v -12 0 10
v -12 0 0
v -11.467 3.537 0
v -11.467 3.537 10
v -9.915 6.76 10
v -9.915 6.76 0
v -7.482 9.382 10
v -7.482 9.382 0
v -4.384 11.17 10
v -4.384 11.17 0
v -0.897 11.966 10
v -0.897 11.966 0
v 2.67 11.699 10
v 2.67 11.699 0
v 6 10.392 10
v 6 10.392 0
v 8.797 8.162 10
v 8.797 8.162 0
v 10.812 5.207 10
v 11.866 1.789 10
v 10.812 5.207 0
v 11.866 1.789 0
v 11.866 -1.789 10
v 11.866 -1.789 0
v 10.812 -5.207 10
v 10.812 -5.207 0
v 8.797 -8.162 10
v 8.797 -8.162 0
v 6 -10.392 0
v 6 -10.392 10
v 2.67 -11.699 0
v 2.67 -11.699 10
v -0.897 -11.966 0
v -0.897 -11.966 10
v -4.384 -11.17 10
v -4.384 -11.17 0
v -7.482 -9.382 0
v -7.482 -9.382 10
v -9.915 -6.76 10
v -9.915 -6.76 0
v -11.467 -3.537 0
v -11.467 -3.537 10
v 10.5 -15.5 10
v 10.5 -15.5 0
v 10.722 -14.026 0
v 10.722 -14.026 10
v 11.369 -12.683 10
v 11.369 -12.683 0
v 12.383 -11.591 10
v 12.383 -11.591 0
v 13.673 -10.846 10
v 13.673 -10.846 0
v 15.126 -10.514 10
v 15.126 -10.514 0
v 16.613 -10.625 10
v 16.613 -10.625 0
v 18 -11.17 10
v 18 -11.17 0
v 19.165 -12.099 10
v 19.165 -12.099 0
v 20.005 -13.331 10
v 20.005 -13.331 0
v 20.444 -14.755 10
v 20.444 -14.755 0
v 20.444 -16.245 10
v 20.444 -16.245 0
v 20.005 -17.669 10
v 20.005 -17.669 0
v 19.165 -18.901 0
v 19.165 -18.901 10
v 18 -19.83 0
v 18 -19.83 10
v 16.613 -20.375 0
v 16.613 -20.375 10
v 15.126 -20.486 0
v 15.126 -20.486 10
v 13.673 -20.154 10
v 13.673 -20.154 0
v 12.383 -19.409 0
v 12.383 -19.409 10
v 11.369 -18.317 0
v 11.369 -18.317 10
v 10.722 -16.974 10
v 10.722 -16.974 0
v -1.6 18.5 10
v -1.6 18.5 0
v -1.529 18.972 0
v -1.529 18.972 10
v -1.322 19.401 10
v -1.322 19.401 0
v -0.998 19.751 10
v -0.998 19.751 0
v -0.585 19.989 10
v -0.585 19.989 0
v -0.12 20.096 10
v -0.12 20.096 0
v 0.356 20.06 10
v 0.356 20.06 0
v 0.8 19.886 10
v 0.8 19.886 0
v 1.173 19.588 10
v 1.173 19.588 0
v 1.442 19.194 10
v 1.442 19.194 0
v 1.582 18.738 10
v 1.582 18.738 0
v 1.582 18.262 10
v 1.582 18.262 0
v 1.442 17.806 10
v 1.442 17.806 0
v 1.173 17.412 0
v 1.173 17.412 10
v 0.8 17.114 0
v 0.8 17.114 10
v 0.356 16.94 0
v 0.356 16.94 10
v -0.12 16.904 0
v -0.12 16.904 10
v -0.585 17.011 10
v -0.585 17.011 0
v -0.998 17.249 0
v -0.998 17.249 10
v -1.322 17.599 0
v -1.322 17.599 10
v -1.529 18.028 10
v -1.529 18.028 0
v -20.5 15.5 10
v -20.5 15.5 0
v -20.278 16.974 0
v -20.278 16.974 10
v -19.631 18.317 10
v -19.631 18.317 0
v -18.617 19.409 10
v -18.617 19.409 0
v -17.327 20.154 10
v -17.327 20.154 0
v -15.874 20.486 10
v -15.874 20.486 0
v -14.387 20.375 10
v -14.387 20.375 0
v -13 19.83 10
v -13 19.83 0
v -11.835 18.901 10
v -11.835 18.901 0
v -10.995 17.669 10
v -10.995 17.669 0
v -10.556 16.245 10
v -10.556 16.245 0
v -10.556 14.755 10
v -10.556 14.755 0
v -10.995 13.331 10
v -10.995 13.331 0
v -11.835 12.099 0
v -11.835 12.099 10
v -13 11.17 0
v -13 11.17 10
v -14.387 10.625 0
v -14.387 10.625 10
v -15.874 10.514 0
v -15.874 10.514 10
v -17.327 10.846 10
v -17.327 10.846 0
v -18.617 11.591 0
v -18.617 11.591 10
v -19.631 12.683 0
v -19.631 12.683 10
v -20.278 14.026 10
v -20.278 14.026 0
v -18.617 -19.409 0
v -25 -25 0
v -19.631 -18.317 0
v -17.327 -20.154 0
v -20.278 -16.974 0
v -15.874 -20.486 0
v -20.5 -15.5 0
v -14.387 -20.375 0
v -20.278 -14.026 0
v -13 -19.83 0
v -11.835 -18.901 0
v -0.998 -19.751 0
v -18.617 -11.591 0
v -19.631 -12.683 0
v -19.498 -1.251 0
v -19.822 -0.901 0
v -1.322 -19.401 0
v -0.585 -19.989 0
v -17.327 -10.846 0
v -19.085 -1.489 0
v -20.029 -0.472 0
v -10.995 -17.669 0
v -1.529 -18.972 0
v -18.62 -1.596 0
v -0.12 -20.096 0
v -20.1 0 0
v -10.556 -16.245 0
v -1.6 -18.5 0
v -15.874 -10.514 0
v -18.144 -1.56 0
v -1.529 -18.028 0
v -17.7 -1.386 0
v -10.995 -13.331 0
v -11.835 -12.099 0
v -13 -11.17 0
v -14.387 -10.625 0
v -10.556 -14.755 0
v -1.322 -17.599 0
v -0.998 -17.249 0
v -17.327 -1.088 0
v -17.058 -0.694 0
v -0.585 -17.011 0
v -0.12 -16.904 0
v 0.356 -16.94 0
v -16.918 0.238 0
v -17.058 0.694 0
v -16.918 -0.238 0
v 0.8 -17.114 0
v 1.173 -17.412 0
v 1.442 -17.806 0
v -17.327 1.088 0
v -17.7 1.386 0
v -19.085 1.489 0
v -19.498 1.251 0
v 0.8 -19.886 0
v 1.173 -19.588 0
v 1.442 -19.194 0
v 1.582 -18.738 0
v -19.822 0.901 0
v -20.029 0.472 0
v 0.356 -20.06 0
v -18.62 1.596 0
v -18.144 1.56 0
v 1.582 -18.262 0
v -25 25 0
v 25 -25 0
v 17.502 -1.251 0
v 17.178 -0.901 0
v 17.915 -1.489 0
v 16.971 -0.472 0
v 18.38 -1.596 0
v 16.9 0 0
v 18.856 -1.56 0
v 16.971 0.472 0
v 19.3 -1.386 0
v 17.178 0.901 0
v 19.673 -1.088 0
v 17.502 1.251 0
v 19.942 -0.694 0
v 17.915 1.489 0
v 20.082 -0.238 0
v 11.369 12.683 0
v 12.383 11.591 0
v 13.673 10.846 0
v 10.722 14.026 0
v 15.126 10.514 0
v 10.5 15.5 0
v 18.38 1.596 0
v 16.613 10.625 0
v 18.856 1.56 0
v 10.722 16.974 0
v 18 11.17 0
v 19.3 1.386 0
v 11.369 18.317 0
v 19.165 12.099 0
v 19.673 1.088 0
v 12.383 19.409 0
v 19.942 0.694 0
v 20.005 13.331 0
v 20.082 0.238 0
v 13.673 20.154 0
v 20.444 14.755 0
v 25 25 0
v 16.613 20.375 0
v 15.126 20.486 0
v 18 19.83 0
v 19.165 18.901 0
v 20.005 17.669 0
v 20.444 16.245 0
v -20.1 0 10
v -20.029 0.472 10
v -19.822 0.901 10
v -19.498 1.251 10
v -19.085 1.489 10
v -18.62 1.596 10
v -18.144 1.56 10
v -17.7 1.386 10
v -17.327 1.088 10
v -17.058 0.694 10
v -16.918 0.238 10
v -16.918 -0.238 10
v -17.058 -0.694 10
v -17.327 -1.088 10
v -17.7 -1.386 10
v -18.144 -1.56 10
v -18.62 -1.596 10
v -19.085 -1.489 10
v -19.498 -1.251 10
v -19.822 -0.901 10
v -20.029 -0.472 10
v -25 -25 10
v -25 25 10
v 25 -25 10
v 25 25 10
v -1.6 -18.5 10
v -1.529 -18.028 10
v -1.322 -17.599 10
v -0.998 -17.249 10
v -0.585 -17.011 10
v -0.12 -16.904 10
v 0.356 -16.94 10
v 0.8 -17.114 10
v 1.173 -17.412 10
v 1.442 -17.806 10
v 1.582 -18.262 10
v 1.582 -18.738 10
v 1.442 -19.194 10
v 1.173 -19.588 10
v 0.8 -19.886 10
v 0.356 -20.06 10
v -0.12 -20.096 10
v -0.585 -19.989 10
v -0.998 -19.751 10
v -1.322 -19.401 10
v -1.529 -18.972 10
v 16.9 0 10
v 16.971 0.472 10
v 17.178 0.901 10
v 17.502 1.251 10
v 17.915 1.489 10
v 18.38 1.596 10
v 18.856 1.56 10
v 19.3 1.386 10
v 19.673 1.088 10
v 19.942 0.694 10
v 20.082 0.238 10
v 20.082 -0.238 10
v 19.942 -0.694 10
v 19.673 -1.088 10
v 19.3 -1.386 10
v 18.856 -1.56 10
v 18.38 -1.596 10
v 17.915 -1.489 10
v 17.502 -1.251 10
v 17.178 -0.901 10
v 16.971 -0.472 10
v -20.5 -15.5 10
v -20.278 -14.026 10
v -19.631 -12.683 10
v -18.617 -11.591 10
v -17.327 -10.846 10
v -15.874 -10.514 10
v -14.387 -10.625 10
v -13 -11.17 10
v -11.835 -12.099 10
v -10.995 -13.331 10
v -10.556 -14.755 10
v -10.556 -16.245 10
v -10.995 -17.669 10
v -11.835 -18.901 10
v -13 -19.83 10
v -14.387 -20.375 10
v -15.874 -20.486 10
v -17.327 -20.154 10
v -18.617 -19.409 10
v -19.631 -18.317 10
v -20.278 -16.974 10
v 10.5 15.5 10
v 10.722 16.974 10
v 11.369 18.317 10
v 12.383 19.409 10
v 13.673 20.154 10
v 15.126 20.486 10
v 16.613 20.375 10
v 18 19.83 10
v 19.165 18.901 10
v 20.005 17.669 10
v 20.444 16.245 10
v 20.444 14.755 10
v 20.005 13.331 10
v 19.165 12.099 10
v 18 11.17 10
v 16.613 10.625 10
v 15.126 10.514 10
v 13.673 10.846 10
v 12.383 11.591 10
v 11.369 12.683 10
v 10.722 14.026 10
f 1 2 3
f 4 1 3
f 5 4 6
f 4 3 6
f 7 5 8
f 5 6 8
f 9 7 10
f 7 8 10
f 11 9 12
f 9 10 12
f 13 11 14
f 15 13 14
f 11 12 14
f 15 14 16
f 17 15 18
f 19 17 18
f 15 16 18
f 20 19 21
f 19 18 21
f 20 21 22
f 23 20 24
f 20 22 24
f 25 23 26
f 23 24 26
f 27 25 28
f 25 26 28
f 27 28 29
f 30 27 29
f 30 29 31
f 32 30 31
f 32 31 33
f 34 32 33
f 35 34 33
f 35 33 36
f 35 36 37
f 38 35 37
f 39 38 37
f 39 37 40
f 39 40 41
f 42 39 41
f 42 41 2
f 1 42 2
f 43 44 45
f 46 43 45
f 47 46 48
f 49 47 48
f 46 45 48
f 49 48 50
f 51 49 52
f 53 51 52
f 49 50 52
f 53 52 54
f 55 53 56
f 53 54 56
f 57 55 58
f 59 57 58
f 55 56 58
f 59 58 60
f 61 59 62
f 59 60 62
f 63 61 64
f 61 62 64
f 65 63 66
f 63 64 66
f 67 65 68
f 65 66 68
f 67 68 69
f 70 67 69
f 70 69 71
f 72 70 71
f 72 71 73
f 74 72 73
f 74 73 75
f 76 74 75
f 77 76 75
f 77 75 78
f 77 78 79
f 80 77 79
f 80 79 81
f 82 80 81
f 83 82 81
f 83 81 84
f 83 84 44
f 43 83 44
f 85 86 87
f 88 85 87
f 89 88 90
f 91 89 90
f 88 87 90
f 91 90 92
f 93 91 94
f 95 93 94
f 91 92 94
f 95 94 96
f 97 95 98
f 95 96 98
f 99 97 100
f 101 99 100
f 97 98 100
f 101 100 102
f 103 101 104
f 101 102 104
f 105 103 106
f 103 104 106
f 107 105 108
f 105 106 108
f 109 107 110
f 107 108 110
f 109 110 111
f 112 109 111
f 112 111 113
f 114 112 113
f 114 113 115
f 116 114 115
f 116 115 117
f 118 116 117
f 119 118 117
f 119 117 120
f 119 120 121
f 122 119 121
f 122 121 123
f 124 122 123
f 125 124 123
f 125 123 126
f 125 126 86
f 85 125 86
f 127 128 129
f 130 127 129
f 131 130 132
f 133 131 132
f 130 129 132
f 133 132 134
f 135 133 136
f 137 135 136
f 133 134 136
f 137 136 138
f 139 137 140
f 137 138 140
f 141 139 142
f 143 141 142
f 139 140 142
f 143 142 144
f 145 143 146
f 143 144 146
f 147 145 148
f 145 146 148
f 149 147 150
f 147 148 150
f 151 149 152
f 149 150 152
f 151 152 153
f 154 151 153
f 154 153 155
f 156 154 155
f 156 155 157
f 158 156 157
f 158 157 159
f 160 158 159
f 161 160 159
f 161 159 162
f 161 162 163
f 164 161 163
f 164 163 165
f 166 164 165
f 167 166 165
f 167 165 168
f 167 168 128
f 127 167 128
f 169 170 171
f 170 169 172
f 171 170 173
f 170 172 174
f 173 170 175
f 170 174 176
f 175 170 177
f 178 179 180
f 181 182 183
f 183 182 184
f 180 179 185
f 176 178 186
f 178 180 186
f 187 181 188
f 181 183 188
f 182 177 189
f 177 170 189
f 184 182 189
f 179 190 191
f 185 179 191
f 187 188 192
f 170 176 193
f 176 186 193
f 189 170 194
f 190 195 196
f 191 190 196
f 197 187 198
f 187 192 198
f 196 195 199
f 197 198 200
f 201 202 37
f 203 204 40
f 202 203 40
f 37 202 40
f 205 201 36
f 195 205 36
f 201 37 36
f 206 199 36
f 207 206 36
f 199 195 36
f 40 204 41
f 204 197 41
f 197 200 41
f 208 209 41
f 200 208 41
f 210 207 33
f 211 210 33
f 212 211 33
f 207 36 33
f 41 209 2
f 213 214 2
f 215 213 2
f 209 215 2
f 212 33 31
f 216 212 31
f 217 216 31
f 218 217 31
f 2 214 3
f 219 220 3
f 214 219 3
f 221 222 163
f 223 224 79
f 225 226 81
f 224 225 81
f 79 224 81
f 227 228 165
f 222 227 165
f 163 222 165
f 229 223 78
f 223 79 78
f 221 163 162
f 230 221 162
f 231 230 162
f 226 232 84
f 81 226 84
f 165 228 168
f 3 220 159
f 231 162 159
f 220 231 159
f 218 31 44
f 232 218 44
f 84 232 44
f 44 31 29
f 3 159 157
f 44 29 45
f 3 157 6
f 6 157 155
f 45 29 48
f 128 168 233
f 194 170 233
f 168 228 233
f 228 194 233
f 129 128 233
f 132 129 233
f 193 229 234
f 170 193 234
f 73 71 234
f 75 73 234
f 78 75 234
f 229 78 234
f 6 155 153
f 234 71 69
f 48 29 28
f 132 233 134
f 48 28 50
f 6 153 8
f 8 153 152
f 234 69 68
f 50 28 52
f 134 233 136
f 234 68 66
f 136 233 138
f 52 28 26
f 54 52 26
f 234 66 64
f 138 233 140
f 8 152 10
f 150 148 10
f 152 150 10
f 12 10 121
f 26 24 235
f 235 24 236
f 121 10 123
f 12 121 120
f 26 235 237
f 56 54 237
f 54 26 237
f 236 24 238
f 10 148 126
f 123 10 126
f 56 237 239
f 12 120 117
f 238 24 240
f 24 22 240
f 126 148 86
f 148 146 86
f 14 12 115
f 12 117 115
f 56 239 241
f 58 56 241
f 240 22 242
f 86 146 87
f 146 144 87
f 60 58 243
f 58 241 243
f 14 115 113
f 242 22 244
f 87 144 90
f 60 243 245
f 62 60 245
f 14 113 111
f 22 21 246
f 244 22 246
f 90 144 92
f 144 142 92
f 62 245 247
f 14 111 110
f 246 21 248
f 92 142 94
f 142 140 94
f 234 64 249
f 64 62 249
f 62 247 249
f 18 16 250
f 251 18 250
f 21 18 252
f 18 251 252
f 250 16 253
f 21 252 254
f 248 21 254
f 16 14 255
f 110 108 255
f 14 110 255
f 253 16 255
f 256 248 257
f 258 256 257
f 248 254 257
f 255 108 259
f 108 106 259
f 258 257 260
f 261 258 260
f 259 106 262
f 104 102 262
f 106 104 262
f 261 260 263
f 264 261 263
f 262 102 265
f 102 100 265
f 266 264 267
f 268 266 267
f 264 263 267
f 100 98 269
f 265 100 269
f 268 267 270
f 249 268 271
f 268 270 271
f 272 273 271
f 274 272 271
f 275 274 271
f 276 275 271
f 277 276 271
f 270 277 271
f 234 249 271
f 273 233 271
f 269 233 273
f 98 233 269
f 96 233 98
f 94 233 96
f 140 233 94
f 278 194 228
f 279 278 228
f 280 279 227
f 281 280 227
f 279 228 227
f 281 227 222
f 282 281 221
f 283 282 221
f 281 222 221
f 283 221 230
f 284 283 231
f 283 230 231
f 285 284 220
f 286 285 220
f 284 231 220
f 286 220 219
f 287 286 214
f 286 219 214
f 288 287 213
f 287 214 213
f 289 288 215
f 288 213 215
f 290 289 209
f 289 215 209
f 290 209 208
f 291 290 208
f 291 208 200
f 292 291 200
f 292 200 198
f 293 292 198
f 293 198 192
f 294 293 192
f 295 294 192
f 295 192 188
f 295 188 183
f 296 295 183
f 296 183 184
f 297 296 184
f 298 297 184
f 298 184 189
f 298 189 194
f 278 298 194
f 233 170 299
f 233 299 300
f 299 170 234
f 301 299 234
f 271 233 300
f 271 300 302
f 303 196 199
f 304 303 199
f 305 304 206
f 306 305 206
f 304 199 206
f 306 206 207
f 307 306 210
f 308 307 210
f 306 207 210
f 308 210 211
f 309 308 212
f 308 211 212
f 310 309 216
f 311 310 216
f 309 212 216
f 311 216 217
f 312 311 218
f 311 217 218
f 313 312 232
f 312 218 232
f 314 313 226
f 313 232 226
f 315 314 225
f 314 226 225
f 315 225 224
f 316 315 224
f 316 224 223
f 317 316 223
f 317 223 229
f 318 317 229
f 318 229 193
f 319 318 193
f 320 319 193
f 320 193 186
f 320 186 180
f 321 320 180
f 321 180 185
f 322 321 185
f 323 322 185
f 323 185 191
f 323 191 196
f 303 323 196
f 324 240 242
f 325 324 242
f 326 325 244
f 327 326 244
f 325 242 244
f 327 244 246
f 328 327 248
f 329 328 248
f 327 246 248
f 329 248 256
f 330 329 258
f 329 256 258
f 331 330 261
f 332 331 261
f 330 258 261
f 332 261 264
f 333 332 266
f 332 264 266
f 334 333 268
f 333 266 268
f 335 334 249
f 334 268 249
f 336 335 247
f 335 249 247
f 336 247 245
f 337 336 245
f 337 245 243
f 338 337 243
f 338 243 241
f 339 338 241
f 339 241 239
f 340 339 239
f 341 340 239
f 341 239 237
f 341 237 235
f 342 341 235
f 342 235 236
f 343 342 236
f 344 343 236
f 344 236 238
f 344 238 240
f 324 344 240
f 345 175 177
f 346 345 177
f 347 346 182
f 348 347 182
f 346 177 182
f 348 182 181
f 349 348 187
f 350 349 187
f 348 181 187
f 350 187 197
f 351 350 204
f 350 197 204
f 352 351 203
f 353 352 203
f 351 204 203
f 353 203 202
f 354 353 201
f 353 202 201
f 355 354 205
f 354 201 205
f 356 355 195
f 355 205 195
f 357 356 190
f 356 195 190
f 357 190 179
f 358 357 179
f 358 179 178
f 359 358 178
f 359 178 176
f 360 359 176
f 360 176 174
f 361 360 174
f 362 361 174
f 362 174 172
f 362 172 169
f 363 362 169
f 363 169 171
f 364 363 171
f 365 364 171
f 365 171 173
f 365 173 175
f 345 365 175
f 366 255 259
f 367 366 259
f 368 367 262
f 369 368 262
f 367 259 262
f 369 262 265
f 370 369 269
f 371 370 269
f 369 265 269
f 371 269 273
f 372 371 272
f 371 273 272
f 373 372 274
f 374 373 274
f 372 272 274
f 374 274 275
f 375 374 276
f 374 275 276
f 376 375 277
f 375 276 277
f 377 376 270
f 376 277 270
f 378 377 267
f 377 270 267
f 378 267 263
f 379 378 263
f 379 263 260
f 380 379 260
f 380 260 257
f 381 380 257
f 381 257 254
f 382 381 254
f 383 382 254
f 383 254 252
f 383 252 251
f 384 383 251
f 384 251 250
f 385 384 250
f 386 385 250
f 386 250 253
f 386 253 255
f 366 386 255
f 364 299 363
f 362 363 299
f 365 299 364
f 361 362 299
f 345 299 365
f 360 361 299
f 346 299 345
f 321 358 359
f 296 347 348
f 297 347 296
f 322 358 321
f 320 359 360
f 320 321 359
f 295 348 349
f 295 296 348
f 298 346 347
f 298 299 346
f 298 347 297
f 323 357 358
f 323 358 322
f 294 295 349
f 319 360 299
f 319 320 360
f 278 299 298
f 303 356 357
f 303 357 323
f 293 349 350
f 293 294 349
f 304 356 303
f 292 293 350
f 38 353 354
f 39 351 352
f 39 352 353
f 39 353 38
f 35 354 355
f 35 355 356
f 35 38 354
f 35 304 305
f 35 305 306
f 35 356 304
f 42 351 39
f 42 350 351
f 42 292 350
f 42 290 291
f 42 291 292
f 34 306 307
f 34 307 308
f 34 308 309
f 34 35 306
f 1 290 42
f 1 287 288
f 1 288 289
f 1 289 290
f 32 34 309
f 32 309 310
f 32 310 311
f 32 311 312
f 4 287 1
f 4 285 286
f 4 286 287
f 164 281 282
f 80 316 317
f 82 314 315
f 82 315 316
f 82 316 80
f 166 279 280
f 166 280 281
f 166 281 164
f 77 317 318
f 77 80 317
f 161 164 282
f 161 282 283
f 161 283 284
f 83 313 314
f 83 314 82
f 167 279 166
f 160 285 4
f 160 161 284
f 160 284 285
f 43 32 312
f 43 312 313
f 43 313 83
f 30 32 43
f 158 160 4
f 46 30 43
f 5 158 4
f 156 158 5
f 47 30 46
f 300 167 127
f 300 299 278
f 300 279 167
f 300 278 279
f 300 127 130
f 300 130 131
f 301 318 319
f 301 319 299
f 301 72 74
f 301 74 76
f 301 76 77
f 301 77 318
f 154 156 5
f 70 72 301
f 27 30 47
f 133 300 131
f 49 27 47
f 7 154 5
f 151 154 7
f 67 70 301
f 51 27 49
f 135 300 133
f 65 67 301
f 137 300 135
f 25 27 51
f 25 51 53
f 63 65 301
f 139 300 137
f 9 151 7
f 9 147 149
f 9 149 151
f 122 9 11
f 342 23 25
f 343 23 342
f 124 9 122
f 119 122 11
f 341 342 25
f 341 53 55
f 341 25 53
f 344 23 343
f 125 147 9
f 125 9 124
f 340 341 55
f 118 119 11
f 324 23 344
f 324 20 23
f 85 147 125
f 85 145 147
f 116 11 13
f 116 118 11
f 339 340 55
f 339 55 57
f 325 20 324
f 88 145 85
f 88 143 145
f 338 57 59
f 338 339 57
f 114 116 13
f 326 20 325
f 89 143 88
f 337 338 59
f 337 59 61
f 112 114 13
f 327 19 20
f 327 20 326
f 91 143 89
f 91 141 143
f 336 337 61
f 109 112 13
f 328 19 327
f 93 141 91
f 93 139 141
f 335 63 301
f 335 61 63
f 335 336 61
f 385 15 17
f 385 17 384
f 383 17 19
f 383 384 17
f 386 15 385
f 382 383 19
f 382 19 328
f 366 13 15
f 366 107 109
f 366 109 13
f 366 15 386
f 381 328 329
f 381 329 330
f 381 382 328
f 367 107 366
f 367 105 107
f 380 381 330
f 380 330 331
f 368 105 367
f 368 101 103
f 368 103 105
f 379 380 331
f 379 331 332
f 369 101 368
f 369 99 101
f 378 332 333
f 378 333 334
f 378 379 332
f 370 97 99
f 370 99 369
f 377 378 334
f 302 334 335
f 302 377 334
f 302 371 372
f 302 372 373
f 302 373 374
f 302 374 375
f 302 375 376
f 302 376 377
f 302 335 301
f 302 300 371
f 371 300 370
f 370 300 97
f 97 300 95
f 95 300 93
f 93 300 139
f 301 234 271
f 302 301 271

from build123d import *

# Parameters (mm, degrees)
SKETCH_1_W        = 50
SKETCH_1_H        = 50
EXTRUDE_1_DEPTH   = 10
HOLE_WIZARD_339_D = 24
HOLE_WIZARD_2_D   = 3.2
HOLE_WIZARD_3_D   = 10


with BuildPart() as part:
    # 草图1 → 凸台-拉伸1 (new body)
    with BuildSketch(Plane.XY):
        Rectangle(SKETCH_1_W, SKETCH_1_H)
    extrude(amount=EXTRUDE_1_DEPTH)

    # Hole Wizard 339 (through all)
    with Locations(Plane.XY.offset(10)):
        with Locations((0, 0)):
            Hole(HOLE_WIZARD_339_D / 2)

    # 孔2 (through all)
    with Locations(Plane.XY.offset(10)):
        with Locations((0, 18.5), (18.5, 0), (0, -18.5), (-18.5, 0)):
            Hole(HOLE_WIZARD_2_D / 2)

    # 孔3 (through all)
    with Locations(Plane.XY.offset(10)):
        with Locations((-15.5, 15.5), (15.5, 15.5), (15.5, -15.5), (-15.5, -15.5)):
            Hole(HOLE_WIZARD_3_D / 2)


solid = part.part
